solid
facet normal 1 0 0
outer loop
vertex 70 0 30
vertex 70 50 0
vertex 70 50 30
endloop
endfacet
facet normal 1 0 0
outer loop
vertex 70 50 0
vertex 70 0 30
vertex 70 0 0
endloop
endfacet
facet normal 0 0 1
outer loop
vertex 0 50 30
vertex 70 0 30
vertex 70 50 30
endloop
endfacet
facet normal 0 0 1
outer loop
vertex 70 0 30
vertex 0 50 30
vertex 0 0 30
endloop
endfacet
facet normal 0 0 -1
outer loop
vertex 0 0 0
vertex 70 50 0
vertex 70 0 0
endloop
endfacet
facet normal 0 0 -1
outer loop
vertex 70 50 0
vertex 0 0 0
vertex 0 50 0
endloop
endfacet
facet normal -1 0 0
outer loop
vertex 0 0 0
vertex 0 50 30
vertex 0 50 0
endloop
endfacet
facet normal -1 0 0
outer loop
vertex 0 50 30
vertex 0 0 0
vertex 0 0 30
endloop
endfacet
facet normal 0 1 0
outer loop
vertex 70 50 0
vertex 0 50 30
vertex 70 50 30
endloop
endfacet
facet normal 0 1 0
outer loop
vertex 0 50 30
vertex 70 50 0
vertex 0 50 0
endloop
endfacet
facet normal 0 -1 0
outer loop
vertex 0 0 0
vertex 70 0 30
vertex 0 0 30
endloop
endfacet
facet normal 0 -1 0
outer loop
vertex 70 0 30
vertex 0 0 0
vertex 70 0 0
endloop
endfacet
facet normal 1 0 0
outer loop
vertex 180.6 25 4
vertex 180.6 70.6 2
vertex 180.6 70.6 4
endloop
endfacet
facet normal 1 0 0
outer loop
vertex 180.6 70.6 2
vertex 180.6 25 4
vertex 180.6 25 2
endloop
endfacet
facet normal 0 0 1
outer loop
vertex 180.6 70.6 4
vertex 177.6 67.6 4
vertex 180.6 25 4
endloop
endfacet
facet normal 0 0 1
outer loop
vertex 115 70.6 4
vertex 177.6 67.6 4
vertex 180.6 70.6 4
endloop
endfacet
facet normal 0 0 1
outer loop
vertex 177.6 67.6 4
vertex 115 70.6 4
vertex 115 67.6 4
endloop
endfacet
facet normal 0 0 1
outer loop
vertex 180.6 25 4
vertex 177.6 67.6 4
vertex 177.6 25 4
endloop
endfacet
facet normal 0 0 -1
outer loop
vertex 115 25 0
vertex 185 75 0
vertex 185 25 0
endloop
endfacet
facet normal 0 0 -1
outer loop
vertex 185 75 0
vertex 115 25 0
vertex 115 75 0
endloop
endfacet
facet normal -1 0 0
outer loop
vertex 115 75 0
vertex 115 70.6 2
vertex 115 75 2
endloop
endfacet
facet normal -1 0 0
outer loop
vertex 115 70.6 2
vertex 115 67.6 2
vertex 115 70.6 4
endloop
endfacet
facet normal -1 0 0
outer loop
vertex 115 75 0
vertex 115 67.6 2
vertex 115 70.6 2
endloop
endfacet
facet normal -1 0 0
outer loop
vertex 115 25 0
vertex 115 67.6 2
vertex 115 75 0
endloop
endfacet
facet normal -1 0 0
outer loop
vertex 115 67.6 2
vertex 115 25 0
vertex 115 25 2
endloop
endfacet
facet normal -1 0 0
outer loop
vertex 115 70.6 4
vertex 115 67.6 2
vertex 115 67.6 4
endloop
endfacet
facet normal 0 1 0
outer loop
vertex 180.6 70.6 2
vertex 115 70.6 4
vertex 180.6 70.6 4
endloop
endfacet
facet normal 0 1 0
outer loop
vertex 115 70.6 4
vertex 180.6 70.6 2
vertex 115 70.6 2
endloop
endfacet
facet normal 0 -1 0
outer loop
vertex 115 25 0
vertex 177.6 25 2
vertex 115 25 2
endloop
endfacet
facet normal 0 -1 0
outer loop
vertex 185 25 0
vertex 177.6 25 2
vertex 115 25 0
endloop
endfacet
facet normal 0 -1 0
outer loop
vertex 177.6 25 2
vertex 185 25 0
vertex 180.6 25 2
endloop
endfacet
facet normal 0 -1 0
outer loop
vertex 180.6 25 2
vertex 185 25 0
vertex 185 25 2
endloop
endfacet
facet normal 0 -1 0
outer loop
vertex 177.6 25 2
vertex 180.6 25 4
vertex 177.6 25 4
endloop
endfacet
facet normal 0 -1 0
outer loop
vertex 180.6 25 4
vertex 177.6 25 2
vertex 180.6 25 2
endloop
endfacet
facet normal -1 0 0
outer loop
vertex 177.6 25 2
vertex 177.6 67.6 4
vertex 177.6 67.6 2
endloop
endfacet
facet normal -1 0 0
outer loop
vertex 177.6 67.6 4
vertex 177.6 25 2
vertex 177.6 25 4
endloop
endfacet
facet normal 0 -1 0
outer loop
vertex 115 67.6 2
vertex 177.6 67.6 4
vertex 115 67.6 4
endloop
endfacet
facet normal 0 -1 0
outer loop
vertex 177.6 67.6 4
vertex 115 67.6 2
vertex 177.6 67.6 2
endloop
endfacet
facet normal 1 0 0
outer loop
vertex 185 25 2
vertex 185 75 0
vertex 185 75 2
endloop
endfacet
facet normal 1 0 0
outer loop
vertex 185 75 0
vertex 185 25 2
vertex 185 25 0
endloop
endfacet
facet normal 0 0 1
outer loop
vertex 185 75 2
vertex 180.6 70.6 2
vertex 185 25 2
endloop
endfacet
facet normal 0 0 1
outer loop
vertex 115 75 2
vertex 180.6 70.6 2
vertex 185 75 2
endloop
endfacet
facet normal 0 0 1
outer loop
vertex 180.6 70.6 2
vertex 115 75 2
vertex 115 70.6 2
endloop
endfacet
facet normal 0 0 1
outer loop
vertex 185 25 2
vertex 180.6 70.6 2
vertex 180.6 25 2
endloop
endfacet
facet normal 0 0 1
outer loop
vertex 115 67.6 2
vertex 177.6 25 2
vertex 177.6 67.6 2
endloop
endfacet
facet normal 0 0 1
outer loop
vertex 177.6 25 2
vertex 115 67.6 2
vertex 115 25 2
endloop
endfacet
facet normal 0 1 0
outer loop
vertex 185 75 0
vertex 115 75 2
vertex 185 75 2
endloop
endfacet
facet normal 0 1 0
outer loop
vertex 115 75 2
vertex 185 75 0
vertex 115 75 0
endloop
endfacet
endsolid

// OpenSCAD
// Two-part enclosure for a small electronics board (Arduino temp logger)
// Part 1: open box, Part 2: lid printed upside down, side by side on the bed.
// Units: mm. Print orientation: both parts rest on the XY plane at z = 0.

// ---- Named dimensions (measured with calipers) ----
box_outer_x   = 70.0;   // box outer length (X)
box_outer_y   = 50.0;   // box outer width  (Y)
box_outer_z   = 30.0;   // box outer height (Z)
wall_t        = 2.0;    // wall thickness
floor_t       = 2.0;    // floor thickness
lid_plate_t   = 2.0;    // lid plate thickness
lid_lip_t     = 1.5;    // lid lip wall thickness
lid_lip_h     = 4.0;    // lid lip height
lid_lip_outer_x = 65.6; // lip outer length (X)
lid_lip_outer_y = 45.6; // lip outer width  (Y)
gap           = 10.0;   // gap between the two parts on the bed

// Derived values
box_inner_x   = box_outer_x - 2 * wall_t;   // 66
box_inner_y   = box_outer_y - 2 * wall_t;   // 46
box_inner_z   = box_outer_z - floor_t;      // 28 (interior height)
lip_inner_x   = lid_lip_outer_x - 2 * lid_lip_t; // 62.6
lip_inner_y   = lid_lip_outer_y - 2 * lid_lip_t; // 42.6

// ---- Part 1: the box (open top), centred on the origin ----
module box() {
    // Outer shell
    cube([box_outer_x, box_outer_y, box_outer_z], center = [0, 0, box_outer_z / 2]);
    difference() {
        // Interior cavity, open at the top (cavity extends 1 mm above the rim)
        cube([box_inner_x, box_inner_y, box_inner_z + 1],
             center = [0, 0, floor_t + box_inner_z / 2]);
    }
}

// ---- Part 2: the lid, printed upside down ----
// Plate lies flat on the bed (z 0..2). The lip is a 1.5 mm wall, 4 mm tall,
// centred on the plate, with a 0.2 mm clearance per side vs. the box opening.
module lid() {
    // Plate
    cube([box_outer_x, box_outer_y, lid_plate_t], center = [0, 0, lid_plate_t / 2]);
    // Lip: outer wall minus inner void (void extends 1 mm above the lip top)
    difference() {
        cube([lid_lip_outer_x, lid_lip_outer_y, lid_lip_h],
             center = [0, 0, lid_plate_t + lid_lip_h / 2]);
        cube([lip_inner_x, lip_inner_y, lid_lip_h + 1],
             center = [0, 0, lid_plate_t + lid_lip_h / 2]);
    }
}

// ---- Place both parts side by side on the bed, 10 mm apart ----
// Box centred at origin; lid on the +X side, centred at (115, 25).
box();
translate([115, 25, 0]) lid();
